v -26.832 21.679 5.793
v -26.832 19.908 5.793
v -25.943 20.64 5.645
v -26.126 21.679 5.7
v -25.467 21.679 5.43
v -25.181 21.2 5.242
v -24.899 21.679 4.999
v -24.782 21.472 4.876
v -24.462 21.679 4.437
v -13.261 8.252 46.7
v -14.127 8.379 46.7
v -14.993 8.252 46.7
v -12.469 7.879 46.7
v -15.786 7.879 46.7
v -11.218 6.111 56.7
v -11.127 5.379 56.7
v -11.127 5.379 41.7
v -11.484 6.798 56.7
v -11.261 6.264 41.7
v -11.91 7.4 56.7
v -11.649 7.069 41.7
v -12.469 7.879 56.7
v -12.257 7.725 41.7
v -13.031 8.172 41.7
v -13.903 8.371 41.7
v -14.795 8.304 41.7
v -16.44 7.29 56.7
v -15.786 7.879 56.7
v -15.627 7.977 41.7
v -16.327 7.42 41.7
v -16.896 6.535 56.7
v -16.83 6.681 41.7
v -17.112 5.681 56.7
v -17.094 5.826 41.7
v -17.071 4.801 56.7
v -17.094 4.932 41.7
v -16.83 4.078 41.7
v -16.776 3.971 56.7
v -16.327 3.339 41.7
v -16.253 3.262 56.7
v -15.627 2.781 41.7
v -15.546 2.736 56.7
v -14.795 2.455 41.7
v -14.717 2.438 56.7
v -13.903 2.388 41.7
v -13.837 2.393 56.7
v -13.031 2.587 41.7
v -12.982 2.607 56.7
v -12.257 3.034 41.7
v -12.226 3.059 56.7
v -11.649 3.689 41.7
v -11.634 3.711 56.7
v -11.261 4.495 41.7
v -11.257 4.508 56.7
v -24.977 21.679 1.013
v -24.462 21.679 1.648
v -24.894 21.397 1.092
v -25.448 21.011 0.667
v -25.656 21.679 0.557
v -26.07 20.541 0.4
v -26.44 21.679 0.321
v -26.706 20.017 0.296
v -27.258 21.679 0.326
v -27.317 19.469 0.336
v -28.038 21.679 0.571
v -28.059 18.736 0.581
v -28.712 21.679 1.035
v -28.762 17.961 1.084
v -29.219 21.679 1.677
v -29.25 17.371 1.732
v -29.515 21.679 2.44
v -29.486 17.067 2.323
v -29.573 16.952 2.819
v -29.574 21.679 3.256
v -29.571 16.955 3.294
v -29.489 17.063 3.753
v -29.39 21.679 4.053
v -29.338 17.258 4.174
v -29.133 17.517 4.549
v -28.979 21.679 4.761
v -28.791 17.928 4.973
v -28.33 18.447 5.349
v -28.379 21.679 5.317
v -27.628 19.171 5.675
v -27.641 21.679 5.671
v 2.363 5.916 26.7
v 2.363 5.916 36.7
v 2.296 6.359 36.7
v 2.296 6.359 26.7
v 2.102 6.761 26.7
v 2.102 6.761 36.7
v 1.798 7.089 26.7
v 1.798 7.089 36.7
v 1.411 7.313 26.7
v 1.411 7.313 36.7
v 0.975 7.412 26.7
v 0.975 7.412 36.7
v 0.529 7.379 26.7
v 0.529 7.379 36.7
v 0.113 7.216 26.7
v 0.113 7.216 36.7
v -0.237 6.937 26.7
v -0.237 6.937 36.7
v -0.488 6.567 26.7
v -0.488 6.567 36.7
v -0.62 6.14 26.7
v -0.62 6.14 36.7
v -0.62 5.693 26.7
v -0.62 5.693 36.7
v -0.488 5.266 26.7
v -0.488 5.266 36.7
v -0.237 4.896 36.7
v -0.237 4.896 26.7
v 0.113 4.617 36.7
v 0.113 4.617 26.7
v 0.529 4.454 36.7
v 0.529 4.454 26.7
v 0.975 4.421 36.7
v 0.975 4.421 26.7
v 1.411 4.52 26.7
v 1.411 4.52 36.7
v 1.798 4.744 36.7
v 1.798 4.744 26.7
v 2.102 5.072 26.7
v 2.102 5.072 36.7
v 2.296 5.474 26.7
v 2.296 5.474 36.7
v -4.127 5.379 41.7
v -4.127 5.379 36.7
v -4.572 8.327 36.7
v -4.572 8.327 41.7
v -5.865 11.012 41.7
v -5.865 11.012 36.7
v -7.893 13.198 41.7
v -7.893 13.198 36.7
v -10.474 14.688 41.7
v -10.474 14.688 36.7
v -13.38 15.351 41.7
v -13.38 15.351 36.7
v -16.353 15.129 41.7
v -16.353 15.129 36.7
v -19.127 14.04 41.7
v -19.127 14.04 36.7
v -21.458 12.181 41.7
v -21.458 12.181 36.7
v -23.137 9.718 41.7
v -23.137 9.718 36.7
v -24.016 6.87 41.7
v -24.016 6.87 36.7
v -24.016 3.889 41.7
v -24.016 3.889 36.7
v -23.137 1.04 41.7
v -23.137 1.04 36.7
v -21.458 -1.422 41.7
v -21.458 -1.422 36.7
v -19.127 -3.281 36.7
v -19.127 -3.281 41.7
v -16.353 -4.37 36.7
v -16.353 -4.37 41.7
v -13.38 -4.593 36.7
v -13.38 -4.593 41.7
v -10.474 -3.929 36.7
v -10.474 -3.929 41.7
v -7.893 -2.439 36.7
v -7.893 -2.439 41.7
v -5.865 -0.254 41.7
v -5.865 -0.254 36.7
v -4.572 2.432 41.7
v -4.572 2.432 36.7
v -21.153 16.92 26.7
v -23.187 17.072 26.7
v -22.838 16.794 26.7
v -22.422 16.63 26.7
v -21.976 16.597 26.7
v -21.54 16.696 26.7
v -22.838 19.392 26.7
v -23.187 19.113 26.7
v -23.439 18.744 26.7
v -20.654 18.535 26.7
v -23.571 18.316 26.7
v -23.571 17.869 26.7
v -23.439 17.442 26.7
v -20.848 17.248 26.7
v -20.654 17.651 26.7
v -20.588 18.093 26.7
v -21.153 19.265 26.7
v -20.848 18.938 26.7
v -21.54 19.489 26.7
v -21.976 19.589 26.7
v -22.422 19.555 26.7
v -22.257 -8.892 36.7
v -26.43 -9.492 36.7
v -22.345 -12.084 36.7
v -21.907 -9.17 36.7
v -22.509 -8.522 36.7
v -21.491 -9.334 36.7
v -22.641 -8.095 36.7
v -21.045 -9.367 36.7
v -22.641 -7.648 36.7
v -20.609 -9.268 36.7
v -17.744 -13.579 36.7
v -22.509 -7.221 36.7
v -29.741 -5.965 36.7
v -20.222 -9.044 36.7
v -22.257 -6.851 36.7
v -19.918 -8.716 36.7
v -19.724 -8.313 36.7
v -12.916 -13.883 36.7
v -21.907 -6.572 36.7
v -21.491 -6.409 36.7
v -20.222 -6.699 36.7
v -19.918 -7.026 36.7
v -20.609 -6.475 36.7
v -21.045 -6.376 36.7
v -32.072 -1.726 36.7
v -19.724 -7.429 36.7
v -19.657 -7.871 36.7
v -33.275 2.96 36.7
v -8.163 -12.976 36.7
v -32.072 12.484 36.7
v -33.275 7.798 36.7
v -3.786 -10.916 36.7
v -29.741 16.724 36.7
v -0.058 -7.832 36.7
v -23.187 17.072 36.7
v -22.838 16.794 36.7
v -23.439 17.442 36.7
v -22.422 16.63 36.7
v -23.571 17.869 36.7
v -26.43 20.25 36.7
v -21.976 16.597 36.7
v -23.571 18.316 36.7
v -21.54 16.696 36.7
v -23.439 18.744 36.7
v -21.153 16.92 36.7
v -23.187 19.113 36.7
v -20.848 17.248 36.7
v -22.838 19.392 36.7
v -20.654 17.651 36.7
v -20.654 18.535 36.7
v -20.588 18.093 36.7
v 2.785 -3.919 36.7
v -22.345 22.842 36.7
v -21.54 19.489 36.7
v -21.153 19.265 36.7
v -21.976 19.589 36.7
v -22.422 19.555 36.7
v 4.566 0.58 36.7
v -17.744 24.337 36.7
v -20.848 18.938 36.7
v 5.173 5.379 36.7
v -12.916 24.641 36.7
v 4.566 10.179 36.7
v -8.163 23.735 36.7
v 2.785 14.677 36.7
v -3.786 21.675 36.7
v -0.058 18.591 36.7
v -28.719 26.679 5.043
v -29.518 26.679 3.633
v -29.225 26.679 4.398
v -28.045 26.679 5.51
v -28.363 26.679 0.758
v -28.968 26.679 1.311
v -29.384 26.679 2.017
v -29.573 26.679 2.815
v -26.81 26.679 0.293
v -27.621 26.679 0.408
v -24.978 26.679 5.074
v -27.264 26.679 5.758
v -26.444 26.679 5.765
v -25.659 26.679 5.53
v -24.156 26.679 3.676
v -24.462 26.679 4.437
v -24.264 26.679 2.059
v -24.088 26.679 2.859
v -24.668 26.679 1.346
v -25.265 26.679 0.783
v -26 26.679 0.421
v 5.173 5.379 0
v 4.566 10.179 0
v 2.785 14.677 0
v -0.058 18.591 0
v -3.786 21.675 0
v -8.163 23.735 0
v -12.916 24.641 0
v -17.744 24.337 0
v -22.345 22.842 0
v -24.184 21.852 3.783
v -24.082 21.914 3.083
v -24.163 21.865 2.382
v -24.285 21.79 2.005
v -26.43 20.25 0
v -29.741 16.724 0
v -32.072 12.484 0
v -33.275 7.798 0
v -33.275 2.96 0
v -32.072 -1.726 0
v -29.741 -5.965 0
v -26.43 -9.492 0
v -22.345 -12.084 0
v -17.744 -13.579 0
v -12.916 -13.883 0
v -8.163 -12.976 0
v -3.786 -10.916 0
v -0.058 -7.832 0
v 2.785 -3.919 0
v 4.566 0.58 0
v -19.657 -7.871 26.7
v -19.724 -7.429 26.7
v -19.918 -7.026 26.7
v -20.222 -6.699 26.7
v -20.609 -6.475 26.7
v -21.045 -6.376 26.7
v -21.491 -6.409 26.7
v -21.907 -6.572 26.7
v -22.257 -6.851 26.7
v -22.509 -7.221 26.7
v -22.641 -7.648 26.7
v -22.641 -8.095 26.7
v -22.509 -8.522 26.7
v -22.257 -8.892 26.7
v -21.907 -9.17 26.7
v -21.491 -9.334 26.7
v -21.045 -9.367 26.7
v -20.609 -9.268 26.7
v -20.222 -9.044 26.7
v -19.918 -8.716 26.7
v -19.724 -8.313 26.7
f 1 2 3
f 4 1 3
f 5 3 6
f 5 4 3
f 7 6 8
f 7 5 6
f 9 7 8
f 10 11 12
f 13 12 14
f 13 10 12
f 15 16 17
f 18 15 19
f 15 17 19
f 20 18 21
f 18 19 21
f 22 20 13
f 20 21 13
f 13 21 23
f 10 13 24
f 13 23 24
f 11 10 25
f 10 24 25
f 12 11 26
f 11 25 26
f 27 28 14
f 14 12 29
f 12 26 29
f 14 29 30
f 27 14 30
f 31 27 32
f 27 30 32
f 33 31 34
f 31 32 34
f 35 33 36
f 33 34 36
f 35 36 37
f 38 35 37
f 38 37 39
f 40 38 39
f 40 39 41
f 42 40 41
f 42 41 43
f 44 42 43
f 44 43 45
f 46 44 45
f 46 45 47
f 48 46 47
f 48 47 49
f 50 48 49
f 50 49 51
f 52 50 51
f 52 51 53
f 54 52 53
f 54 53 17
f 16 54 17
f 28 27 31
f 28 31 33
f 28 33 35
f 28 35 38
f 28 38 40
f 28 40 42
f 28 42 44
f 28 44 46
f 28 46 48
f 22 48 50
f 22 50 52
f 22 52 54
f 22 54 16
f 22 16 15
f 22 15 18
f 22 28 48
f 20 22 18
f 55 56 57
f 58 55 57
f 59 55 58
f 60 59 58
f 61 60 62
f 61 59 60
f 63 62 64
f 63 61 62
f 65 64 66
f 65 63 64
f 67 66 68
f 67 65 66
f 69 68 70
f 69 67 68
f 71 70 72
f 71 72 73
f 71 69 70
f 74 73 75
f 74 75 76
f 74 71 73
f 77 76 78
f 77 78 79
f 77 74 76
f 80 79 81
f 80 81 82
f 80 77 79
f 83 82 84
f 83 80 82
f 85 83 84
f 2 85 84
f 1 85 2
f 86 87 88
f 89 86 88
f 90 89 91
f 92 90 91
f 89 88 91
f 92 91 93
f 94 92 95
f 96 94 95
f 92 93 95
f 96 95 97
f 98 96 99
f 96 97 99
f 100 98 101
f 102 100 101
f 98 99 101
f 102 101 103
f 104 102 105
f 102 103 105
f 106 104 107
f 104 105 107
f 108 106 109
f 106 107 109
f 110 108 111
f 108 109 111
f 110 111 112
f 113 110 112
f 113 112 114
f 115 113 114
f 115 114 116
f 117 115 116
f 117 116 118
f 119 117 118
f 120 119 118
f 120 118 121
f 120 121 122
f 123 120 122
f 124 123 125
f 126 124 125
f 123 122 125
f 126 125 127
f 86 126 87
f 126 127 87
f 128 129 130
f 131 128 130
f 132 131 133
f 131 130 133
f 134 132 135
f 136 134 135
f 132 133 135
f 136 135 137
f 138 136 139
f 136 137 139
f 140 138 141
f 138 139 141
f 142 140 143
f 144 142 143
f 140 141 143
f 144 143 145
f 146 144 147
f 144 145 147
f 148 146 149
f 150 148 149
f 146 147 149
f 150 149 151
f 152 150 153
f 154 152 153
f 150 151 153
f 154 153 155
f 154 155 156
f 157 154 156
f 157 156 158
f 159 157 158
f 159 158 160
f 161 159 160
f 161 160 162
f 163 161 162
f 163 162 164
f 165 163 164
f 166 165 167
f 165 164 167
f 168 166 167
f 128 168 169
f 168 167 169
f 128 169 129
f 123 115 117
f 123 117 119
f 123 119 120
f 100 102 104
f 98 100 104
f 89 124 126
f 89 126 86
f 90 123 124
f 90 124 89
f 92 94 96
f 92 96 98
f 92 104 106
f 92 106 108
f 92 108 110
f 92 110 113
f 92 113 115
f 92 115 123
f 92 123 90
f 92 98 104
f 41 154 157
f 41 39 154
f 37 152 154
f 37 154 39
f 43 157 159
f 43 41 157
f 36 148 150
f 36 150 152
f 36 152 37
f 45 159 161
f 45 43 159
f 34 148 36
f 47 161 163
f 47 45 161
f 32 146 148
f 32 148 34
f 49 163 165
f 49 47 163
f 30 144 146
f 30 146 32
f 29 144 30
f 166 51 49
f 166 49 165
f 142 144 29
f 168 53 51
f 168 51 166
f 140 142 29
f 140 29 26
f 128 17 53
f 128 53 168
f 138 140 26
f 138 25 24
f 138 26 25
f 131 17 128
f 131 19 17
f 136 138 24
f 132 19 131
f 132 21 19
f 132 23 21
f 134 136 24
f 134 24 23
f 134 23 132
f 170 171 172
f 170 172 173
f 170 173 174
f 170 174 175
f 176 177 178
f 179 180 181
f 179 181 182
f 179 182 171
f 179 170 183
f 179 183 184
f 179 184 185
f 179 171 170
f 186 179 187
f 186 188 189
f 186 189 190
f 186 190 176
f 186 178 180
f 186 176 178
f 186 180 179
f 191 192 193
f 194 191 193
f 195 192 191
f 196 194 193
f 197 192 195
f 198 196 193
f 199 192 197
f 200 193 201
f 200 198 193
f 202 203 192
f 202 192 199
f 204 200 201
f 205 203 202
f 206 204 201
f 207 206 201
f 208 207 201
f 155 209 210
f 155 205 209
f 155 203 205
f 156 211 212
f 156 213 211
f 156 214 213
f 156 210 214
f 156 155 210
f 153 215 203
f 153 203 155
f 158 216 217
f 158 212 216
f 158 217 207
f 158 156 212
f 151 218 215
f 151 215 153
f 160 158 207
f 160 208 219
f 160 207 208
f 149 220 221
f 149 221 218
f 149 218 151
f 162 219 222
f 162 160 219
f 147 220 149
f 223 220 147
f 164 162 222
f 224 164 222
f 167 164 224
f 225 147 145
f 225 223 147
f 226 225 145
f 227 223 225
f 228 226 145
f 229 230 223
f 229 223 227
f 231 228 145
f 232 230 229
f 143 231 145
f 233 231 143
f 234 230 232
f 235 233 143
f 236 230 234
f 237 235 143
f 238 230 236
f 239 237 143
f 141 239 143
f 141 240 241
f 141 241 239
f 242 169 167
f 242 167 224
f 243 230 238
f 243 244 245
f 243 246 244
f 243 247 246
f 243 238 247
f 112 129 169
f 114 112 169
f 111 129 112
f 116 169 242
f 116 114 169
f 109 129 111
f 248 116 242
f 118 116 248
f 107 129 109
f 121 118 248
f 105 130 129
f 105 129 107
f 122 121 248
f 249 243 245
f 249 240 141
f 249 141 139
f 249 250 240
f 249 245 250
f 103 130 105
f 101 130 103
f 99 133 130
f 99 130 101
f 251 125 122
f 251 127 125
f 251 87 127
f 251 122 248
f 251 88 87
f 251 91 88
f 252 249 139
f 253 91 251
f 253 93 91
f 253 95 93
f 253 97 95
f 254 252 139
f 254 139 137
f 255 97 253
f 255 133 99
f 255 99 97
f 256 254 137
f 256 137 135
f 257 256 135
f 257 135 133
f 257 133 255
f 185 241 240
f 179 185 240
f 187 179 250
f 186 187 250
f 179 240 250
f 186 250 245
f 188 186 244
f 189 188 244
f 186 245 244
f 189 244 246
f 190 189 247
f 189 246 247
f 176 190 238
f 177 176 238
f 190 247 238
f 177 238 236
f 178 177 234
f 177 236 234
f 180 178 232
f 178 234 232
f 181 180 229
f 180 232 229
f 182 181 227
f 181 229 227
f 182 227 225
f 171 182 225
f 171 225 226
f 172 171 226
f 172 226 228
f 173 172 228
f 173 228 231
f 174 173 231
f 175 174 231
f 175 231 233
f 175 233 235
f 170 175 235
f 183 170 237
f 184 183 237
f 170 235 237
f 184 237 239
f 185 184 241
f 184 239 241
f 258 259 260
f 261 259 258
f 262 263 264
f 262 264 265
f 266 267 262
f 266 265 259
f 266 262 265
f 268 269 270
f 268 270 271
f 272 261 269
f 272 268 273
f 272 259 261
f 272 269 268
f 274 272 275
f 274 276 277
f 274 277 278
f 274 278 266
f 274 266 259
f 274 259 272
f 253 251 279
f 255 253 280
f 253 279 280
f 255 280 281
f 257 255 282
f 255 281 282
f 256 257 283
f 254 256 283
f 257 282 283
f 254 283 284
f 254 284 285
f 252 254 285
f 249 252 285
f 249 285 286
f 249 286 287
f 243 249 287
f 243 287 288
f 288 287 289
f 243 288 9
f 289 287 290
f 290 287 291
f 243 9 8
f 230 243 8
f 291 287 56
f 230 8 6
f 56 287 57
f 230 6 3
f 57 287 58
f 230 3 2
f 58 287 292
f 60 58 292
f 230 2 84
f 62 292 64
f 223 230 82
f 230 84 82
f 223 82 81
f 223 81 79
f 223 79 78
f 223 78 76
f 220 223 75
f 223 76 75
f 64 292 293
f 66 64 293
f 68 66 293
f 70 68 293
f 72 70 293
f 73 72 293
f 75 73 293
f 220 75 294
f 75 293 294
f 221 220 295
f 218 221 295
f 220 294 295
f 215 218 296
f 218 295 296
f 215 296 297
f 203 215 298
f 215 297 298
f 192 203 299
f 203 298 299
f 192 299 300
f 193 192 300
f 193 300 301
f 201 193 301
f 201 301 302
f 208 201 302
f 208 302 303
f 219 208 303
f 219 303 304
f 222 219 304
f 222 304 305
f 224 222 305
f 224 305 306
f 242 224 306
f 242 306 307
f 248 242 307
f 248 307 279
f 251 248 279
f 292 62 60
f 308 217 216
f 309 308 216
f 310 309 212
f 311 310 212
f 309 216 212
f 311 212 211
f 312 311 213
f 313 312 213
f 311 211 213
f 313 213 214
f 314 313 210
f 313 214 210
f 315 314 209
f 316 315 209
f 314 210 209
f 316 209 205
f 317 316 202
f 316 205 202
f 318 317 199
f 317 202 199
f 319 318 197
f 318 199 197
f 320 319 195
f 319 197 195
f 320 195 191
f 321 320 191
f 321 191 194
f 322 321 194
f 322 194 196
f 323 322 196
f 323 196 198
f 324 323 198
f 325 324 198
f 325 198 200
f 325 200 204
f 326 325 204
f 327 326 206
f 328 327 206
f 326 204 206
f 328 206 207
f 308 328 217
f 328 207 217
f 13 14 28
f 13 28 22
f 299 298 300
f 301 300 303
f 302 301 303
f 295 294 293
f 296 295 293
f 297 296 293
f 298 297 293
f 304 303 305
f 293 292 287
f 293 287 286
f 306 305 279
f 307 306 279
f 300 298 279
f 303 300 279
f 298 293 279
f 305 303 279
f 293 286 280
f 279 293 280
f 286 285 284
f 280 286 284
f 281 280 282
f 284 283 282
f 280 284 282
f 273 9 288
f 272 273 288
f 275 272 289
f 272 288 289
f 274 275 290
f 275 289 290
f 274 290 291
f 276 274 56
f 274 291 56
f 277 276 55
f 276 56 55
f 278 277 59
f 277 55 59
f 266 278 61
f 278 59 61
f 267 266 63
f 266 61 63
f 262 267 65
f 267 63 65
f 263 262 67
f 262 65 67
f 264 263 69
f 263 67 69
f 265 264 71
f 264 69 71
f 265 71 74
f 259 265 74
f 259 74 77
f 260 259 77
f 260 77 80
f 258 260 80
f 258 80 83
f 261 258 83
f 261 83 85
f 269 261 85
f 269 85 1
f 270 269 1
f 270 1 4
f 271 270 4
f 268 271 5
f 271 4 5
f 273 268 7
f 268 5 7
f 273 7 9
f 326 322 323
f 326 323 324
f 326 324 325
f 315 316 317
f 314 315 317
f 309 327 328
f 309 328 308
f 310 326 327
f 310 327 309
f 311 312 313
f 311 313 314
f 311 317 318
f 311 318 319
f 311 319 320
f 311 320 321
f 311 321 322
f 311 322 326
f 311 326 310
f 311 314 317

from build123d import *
from build123d.topology import SkipClean

# Parameters (mm, degrees)
SKETCH1_R           = 19.3
BOSS_EXTRUDE1_DEPTH = 36.7
SKETCH3_R           = 10
BOSS_EXTRUDE2_DEPTH = 5
SKETCH4_R           = 3
BOSS_EXTRUDE3_DEPTH = 15
BOSS_EXTRUDE4_START = -3
SKETCH8_R           = 2.75
BOSS_EXTRUDE4_DEPTH = 15
SKETCH9_R           = 2.75
BOSS_EXTRUDE5_DEPTH = 5
SKETCH5_R           = 1.5
CUT_EXTRUDE1_DEPTH  = 10
CUT_EXTRUDE2_DEPTH  = 10


with BuildPart() as part:
    # Sketch1 → Boss-Extrude1 (new body)
    with BuildSketch(Plane.XY):
        with Locations((-14.127422454, 5.37928778)):
            Circle(SKETCH1_R)
    extrude(amount=BOSS_EXTRUDE1_DEPTH)

    # Sketch3 → Boss-Extrude2 (add)
    with BuildSketch(Plane.XY.offset(36.7)):
        with Locations((-14.127422454, 5.37928778)):
            Circle(SKETCH3_R)
    extrude(amount=BOSS_EXTRUDE2_DEPTH)

    # Sketch4 → Boss-Extrude3 (add)
    with BuildSketch(Plane.XY.offset(41.7)):
        with Locations((-14.127422454, 5.37928778)):
            Circle(SKETCH4_R)
    extrude(amount=BOSS_EXTRUDE3_DEPTH)



with BuildPart() as body_2:
    # Sketch8 → Boss-Extrude4 (new body)
    with BuildSketch(Plane(origin=(0, 24.67928778, 0), x_dir=(1, 0, 0), z_dir=(0, 1, 0)).offset(BOSS_EXTRUDE4_START)):
        with Locations(Location((-26.832117877, -3.04260895, 0), (0, 0, 270))):
            Circle(SKETCH8_R)
    extrude(amount=-BOSS_EXTRUDE4_DEPTH)


with BuildPart() as part_1:
    with SkipClean():  # the faces are left unmerged after this step: merging them gives an invalid solid
        add(part.part)

        add(body_2.part)  # Boss-Extrude5 merges body 2
        # Sketch9 → Boss-Extrude5 (add)
        with BuildSketch(Plane(origin=(0, 21.67928778, 0), x_dir=(1, 0, 0), z_dir=(0, 1, 0))):
            with Locations(Location((-26.832117877, -3.04260895, 0), (0, 0, 329.533131332))):
                Circle(SKETCH9_R)
        extrude(amount=BOSS_EXTRUDE5_DEPTH)

    # Sketch5 → Cut-Extrude1 (cut)
    with SkipClean():  # the faces are left unmerged after this step: merging them gives an invalid solid
        with BuildSketch(Plane.XY.offset(36.7)):
            with Locations((0.862954929, 5.91648973)):
                Circle(SKETCH5_R)
            with Locations((-21.15738061, -7.87136082)):
                Circle(SKETCH5_R)
            with Locations((-22.08784168, 18.092734431)):
                Circle(SKETCH5_R)
        extrude(amount=-CUT_EXTRUDE1_DEPTH, mode=Mode.SUBTRACT)

    # Sketch10 → Cut-Extrude2 (cut)
    with SkipClean():  # the faces are left unmerged after this step: merging them gives an invalid solid
        with BuildSketch(Plane.XY.offset(56.7)):
            Polygon((-86.266834938, 7.87928778), (-15.785734849, 7.87928778), (-12.469110059, 7.87928778), (58.011990031, 7.87928778), (58.011990031, 148.841487959), (-86.266834938, 148.841487959), align=None)
        extrude(amount=-CUT_EXTRUDE2_DEPTH, mode=Mode.SUBTRACT)


solid = part_1.part
